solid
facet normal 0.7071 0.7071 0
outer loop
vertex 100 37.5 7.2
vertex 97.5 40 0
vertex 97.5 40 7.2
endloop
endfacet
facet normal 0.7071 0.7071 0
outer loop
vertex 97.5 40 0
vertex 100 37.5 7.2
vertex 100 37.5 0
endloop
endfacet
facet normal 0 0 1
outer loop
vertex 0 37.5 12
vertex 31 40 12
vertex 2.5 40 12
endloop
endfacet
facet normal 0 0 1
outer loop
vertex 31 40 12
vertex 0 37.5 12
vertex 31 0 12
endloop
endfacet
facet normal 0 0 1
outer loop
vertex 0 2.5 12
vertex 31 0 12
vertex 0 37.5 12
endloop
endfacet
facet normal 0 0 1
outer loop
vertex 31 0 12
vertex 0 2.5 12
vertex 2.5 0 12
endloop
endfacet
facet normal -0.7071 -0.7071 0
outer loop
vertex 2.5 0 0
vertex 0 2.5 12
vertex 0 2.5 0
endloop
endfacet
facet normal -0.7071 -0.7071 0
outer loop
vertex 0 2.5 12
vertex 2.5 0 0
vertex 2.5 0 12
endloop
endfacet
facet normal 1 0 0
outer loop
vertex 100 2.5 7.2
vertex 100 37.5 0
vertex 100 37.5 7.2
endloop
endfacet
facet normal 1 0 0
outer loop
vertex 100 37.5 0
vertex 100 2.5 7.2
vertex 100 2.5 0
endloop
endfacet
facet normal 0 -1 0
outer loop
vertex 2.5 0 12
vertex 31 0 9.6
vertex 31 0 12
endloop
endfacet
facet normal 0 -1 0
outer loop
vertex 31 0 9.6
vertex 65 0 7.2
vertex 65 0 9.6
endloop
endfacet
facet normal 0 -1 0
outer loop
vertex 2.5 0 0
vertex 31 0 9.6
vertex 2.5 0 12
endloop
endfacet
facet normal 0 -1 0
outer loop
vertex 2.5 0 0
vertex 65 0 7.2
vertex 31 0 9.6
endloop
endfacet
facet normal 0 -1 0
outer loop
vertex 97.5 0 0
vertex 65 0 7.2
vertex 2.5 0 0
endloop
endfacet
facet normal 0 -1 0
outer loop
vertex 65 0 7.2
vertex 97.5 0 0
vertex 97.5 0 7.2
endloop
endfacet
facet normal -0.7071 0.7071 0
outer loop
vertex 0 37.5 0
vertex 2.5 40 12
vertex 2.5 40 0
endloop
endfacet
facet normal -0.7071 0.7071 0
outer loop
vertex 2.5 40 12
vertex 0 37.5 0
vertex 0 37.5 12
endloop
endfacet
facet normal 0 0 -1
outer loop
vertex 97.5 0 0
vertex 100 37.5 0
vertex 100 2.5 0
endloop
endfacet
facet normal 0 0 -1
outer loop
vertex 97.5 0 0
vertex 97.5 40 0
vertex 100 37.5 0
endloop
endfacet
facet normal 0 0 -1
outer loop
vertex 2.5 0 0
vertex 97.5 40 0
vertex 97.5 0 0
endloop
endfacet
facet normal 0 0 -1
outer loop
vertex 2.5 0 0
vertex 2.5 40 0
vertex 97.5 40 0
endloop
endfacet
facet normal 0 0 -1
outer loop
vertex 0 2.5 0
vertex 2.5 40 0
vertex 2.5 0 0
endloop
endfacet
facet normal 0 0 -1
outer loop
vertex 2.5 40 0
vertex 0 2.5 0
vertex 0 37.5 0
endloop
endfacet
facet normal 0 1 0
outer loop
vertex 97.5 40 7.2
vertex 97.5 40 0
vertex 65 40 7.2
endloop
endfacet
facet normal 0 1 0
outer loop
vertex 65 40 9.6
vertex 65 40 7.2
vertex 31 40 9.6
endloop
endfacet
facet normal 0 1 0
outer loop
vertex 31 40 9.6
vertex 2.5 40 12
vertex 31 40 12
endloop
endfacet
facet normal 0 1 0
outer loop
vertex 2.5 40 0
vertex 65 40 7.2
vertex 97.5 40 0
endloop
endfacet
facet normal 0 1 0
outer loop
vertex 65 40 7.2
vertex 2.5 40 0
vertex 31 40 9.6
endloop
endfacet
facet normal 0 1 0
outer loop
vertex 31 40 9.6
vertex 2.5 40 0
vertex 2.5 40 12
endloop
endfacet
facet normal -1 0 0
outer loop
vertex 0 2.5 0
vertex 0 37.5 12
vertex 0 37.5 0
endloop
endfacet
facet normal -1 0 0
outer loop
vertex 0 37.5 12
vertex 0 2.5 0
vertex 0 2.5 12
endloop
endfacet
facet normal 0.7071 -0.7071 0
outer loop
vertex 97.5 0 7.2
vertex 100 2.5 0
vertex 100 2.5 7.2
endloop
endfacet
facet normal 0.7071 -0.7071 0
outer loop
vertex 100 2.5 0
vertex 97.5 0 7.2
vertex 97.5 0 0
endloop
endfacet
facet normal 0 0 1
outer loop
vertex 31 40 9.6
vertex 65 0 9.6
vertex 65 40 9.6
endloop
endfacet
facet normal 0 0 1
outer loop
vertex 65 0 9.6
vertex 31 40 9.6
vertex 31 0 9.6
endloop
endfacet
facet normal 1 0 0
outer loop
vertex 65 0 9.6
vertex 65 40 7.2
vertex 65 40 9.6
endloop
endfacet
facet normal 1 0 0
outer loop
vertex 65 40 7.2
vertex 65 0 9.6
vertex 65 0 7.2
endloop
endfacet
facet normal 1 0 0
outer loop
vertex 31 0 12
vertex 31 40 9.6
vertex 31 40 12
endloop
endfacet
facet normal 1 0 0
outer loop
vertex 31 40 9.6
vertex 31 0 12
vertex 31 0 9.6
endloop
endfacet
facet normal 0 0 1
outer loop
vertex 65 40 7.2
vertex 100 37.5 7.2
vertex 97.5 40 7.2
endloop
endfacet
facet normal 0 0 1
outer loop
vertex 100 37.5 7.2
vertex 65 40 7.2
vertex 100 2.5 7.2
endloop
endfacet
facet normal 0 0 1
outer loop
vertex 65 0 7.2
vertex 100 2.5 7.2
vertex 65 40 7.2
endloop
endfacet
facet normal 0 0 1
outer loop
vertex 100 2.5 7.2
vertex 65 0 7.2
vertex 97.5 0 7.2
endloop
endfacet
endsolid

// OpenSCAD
$fn = 32;

// ----------------------------------------------------------------------
// Stepped bar: twostep, 100 x 40 x 12/7.2 mm
// ----------------------------------------------------------------------

// --- parameters (mm) ---
bar_l = 100;              // bar length, X
bar_w = 40;               // bar width, Y
plate_t = 12;             // thickness of the thick zone, Z
thin_t = 7.2;             // thickness of the thin zone
corner_c = 2.5;           // corner chamfer of the bar
step_cut = 4.8;           // material removed from the thin zone
stair1_x = 31;            // position of the first stair
stair2_x = 65;            // position of the second stair
mid_t = 9.6;              // thickness of the middle zone
depth_1 = 2.4;            // depth of cut 1 from the top face
depth_2 = 4.8;            // depth of cut 2 from the top face

profile = [[2.5, 0], [97.5, 0], [100, 2.5], [100, 37.5], [97.5, 40], [2.5, 40], [0, 37.5], [0, 2.5]];  // primary outline, 8 points, counter clockwise
void_1 = [[31, -1], [65, -1], [65, 41], [31, 41]];  // first stair, 4 points
void_2 = [[65, -1], [101, -1], [101, 41], [65, 41]];  // second stair, 4 points

// --- the one profile operation ---
difference() {
  linear_extrude(height = plate_t) polygon(points = profile);
  translate([0, 0, plate_t - depth_1])
    linear_extrude(height = depth_1 + 1) polygon(points = void_1);
  translate([0, 0, plate_t - depth_2])
    linear_extrude(height = depth_2 + 1) polygon(points = void_2);
}
